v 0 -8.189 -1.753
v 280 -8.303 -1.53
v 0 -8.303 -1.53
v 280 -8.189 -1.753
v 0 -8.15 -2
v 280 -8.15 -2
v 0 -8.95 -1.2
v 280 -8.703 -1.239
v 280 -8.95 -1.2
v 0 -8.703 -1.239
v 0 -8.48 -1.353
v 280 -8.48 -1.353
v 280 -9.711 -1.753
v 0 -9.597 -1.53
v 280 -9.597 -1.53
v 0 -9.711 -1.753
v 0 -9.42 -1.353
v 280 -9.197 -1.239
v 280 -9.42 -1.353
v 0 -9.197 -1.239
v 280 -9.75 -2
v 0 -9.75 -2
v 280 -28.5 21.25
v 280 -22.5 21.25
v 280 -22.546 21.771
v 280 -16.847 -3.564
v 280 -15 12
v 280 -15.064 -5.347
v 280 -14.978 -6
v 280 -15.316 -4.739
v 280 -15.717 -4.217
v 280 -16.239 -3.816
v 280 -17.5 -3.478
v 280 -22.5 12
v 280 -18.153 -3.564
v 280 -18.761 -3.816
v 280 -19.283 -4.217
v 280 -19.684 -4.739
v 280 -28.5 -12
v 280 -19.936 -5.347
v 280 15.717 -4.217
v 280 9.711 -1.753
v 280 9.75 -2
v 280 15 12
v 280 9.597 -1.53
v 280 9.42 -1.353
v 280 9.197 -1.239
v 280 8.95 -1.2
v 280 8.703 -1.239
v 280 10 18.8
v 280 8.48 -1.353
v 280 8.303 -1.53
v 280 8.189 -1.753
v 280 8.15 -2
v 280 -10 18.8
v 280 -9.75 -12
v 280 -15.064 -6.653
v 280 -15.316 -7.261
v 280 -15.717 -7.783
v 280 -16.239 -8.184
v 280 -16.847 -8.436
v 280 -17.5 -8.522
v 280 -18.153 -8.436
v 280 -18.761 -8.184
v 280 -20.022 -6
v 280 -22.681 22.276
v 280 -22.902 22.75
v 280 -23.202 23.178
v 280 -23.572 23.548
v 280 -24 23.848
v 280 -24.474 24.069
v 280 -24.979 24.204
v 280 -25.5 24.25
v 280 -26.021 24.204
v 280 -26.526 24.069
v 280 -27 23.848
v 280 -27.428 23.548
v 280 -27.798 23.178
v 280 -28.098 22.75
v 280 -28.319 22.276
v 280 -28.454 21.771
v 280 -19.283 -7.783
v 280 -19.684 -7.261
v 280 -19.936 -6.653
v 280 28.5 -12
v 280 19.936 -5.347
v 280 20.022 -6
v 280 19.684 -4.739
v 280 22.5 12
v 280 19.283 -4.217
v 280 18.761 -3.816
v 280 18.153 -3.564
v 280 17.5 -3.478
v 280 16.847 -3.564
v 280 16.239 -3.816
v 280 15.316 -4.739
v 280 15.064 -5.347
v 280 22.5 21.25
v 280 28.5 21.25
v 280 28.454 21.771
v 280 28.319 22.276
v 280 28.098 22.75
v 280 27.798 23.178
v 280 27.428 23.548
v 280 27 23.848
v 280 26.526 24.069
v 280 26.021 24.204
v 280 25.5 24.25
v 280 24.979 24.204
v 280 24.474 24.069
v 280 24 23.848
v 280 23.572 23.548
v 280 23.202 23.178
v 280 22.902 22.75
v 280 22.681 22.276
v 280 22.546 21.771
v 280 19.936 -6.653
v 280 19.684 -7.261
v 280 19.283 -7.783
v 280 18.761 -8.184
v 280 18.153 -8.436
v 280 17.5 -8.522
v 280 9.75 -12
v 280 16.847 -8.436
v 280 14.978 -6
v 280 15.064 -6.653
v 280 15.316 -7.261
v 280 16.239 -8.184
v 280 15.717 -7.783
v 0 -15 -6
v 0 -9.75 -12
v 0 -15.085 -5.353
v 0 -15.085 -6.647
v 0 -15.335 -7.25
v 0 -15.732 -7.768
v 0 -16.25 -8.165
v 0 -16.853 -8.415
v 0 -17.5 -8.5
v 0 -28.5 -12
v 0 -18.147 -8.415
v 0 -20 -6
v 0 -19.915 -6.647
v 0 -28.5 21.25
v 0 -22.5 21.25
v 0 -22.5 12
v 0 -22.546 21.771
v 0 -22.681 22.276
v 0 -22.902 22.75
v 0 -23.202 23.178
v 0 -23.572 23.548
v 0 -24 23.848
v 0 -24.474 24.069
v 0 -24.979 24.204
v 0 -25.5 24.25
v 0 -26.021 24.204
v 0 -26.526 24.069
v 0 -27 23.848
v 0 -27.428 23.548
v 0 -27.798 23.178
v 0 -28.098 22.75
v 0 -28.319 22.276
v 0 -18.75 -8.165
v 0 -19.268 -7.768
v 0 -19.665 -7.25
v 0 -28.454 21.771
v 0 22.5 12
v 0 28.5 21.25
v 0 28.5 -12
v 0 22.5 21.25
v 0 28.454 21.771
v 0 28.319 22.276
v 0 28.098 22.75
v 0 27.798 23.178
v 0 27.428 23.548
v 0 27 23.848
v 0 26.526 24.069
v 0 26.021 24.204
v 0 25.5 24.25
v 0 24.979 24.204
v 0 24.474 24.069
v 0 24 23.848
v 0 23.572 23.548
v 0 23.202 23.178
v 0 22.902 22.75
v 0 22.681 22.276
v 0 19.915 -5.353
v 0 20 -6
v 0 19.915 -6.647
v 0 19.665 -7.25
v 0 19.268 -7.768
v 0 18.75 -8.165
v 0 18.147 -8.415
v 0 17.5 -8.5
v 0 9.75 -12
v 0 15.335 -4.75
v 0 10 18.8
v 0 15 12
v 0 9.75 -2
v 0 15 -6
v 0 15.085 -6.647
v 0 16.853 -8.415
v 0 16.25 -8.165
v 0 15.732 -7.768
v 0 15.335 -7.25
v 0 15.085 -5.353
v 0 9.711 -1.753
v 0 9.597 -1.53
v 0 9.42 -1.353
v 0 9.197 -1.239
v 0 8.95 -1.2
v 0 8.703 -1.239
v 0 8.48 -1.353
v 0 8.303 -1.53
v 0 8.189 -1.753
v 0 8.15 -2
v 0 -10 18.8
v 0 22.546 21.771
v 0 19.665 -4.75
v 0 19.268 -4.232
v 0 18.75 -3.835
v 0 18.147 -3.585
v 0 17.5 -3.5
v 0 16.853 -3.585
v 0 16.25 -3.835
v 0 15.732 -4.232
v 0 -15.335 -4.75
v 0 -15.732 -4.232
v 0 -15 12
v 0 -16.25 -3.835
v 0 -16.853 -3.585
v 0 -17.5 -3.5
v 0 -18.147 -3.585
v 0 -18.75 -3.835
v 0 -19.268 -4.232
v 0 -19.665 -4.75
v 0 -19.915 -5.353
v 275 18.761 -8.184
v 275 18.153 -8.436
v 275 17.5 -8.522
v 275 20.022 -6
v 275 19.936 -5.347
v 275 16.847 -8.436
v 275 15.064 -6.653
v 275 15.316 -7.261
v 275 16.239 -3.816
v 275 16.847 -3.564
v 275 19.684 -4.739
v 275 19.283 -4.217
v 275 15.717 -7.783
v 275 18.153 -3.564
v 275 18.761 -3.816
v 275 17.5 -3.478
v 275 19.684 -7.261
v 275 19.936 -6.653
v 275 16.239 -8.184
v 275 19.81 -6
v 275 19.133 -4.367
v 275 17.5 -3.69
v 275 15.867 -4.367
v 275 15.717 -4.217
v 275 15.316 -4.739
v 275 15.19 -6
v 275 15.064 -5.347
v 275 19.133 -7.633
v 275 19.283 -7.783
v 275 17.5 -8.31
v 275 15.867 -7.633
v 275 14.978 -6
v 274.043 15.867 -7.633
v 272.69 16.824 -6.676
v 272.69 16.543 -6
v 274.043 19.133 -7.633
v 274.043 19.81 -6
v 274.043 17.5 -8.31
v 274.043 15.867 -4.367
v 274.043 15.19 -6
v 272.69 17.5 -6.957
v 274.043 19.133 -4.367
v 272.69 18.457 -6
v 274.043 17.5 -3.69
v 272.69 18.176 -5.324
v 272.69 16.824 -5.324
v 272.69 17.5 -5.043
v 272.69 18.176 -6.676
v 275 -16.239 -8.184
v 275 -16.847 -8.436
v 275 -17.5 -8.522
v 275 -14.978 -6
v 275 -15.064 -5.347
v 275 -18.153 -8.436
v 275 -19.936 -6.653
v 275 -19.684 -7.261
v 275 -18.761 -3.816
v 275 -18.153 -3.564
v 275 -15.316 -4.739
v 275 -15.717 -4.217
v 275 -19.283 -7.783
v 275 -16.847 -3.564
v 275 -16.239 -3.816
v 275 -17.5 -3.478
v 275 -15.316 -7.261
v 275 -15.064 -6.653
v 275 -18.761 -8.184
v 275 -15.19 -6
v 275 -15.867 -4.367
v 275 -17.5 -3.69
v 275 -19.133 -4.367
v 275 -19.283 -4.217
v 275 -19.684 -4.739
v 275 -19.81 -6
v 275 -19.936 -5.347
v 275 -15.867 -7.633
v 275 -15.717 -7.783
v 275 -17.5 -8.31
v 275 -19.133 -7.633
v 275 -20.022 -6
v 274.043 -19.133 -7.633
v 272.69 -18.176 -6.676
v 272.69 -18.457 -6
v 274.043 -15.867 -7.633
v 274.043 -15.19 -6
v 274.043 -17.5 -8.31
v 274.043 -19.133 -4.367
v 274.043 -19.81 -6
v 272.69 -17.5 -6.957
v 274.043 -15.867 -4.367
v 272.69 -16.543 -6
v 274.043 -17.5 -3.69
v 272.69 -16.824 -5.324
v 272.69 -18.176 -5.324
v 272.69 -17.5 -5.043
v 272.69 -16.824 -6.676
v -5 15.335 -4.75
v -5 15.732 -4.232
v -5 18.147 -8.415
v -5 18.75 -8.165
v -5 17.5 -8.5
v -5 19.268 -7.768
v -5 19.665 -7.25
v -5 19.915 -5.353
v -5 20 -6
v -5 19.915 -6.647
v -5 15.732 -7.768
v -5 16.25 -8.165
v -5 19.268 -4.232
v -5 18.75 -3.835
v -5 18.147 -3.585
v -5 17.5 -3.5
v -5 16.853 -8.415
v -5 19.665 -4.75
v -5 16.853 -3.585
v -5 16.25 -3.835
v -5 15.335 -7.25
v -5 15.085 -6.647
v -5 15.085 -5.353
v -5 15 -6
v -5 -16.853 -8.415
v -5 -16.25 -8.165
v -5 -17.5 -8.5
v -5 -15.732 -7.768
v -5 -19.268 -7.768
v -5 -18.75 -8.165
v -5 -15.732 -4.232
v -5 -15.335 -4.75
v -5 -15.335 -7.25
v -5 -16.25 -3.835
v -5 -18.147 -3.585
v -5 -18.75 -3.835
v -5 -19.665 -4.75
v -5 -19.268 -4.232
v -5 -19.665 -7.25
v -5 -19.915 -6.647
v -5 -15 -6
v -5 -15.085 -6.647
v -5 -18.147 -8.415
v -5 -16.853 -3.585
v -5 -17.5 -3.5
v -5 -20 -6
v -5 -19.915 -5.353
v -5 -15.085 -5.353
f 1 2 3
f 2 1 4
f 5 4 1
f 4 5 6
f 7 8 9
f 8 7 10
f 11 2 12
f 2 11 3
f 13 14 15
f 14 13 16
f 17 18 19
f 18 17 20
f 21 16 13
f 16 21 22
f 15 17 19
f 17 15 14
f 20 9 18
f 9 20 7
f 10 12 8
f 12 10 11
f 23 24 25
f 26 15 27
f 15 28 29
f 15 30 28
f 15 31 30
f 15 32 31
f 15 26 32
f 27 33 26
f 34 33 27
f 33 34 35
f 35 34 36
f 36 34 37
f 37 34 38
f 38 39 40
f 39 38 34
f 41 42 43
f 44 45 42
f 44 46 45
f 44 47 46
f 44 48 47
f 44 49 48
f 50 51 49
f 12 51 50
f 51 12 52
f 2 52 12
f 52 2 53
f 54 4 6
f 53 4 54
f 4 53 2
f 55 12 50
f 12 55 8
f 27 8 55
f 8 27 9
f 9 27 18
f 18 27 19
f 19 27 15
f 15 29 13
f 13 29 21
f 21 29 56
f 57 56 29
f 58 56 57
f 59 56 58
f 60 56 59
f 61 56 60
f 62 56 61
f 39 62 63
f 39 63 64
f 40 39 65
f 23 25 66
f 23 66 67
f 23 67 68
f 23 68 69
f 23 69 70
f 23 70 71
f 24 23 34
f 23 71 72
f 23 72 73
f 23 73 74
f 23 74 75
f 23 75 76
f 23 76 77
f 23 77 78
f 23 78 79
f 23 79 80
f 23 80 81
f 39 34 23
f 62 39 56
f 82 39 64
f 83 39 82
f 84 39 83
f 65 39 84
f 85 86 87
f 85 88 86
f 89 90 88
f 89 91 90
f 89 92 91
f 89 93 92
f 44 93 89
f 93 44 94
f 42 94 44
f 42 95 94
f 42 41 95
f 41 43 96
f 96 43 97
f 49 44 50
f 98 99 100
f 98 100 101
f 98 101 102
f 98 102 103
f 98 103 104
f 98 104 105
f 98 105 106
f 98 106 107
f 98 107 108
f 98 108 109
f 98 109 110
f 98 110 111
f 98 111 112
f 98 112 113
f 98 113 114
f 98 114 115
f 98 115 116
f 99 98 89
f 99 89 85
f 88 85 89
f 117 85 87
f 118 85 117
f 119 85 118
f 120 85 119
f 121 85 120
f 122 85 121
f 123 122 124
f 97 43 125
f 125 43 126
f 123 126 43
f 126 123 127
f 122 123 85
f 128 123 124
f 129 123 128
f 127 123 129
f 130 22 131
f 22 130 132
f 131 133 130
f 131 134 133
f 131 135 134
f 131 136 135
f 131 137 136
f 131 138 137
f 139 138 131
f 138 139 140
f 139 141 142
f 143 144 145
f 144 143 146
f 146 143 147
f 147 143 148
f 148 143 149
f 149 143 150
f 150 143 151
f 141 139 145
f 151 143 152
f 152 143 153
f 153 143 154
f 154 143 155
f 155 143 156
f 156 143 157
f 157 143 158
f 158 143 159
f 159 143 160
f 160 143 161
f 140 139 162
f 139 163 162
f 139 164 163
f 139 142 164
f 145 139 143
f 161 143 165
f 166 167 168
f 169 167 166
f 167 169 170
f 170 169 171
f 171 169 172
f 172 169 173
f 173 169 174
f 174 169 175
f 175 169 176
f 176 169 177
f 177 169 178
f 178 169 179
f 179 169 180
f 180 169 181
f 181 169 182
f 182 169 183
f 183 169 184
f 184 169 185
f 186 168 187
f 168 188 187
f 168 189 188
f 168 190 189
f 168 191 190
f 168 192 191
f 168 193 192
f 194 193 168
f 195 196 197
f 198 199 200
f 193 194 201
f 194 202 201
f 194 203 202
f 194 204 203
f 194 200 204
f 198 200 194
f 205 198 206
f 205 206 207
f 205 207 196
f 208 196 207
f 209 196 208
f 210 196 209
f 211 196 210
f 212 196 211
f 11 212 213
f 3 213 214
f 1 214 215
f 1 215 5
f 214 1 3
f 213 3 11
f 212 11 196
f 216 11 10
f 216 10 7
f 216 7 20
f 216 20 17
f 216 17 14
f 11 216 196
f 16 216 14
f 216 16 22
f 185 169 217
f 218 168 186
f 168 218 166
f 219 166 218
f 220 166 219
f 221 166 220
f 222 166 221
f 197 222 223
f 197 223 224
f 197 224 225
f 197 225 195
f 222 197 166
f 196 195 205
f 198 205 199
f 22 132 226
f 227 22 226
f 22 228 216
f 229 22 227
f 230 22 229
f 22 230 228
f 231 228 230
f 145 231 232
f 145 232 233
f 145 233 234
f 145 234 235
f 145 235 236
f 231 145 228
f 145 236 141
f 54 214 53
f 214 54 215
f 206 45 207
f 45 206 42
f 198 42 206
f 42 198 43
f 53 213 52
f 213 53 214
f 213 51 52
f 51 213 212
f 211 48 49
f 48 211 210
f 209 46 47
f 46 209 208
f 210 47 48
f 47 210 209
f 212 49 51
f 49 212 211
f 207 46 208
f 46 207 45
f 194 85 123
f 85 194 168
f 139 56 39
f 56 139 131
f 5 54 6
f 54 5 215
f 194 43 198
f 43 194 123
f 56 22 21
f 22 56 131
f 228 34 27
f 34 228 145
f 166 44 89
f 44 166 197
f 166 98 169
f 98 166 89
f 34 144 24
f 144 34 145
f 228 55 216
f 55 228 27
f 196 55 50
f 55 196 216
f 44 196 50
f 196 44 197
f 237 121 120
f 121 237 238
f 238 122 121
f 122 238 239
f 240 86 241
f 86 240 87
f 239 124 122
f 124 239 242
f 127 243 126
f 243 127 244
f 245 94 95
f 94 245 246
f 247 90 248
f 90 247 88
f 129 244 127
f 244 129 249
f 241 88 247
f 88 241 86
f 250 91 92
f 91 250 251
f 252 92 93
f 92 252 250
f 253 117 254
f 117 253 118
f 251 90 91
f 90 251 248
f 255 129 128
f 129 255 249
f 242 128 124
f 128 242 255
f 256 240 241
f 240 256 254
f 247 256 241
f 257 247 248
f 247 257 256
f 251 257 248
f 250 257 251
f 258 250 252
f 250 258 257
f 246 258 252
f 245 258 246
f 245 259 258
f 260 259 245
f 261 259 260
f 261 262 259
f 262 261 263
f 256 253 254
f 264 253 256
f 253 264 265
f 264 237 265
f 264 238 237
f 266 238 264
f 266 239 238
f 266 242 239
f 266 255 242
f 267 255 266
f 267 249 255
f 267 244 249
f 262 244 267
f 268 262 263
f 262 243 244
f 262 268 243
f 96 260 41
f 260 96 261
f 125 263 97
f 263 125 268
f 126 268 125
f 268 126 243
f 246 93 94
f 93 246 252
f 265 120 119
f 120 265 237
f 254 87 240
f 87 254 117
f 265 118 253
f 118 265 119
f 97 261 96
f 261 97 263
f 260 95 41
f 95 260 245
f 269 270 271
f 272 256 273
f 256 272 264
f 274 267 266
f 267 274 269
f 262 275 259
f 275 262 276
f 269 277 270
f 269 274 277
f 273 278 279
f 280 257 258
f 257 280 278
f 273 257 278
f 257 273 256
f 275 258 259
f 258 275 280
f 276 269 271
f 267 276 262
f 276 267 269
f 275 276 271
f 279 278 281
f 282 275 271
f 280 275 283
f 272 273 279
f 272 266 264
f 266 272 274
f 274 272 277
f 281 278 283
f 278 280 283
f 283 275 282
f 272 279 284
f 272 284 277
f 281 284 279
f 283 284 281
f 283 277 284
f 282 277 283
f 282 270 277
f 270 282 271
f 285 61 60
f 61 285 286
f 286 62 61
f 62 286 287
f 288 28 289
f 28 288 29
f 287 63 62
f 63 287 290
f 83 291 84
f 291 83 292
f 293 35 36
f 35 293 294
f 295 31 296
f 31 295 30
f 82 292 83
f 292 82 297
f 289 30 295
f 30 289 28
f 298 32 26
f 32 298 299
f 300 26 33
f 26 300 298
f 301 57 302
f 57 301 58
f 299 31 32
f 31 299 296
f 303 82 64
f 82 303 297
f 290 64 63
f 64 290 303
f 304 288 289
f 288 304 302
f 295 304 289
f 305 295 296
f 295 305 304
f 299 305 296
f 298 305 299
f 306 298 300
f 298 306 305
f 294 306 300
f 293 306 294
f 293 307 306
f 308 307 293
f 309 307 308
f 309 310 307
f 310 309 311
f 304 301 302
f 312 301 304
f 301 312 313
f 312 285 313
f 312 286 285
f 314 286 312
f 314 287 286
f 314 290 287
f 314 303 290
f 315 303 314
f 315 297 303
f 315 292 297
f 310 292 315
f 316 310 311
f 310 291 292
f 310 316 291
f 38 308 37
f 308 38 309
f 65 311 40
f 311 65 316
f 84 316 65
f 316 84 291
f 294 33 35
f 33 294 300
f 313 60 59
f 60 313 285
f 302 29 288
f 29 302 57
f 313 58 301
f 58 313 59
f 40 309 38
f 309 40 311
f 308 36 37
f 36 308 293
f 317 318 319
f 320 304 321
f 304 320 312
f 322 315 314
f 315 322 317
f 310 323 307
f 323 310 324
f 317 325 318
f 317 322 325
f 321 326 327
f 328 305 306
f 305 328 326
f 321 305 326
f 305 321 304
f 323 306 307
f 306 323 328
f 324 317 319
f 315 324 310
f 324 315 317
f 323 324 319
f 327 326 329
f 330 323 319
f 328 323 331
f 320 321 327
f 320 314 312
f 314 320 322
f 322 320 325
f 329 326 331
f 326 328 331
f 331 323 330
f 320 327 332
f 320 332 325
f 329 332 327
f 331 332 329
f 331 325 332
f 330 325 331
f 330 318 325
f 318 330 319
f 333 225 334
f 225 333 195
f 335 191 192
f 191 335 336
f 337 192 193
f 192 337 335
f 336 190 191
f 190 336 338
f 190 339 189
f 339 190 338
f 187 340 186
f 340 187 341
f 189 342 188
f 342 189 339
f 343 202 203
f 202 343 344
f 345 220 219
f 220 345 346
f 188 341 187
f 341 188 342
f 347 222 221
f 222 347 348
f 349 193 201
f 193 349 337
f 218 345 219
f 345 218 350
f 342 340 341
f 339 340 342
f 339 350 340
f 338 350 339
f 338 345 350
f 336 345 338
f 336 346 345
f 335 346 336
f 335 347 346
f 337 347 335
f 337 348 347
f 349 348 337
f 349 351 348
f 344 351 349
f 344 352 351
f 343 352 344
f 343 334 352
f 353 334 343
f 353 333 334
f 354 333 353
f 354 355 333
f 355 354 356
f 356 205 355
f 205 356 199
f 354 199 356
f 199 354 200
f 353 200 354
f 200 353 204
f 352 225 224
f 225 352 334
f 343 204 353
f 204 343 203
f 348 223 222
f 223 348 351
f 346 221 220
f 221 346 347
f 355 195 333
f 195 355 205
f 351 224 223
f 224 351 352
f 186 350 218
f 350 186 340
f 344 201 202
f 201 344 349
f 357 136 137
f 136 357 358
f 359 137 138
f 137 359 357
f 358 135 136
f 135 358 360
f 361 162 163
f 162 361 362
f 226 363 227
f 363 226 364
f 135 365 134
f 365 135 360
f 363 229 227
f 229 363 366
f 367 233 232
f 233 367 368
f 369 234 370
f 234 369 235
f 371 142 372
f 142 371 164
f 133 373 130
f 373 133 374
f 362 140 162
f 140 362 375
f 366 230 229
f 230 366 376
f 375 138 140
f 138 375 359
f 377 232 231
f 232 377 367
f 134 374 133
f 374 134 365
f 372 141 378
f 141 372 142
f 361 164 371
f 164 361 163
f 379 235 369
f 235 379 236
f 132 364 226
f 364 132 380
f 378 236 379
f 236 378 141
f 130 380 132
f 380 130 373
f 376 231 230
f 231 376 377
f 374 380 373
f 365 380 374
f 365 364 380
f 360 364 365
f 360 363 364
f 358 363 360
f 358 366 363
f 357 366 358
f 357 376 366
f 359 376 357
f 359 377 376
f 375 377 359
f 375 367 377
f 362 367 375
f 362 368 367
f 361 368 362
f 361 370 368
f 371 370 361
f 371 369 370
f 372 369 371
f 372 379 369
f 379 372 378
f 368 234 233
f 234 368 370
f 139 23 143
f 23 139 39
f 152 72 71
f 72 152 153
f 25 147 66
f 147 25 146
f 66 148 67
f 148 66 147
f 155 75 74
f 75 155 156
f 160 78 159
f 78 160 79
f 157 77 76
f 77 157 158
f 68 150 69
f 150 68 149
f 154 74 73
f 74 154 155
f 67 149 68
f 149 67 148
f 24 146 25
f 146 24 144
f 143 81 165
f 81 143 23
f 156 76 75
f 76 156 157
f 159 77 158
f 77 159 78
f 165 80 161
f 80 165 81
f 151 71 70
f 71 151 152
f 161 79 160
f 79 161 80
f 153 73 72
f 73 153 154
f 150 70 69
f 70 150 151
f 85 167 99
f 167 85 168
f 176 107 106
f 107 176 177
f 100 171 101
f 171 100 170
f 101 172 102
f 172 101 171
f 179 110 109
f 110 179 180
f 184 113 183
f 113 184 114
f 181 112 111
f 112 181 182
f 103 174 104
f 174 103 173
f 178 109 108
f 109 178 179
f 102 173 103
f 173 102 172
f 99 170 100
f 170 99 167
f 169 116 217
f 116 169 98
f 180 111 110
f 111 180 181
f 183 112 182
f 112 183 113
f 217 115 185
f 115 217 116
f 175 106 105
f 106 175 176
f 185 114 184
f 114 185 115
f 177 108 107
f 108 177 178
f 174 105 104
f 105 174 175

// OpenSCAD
// file: bottom_bracket.scad
include <dimensions.scad> 

module screw_slot() {
  $fn=32;
  
  cylinder(h=total_height+1, d=screw_body_clearance);
  cylinder(h=total_height - screw_body_depth - screw_angle_depth, d=screw_head_clearance);
  translate([0, 0, total_height - screw_body_depth - screw_angle_depth]) {
    cylinder(h=screw_angle_depth, d1=screw_head_clearance, d2=screw_body_clearance);
  }
}

// Z should be set to the surface that is being joined to
module joiner_pins_male() {
  translate([depth/2, (hd_enclosure_width/2) - pin_diameter, 0]) {
    cylinder(d=pin_diameter, h=pin_length, $fn=24);
  }
  translate([depth/2, -((hd_enclosure_width/2) - pin_diameter), 0]) {
    cylinder(d=pin_diameter, h=pin_length, $fn=24);
  }
}

module cylinder_outer(height,radius,fn){
  fudge = 1/cos(180/fn);
  cylinder(h=height,r=radius*fudge,$fn=fn);
}

module sphere_outer(r,fn){
  fudge = 1/cos(180/fn);
  sphere(r=r*fudge,$fn=fn);
}

module octahedron(r=10) {
    polyhedron(
        points=[
            [r,0,0], [-r,0,0], [0,r,0], [0,-r,0], // Equator
            [0,0,r], [0,0,-r]                      // Poles
        ],
        faces=[
            [0,2,4], [2,1,4], [1,3,4], [3,0,4],    // Top faces
            [0,3,5], [3,1,5], [1,2,5], [2,0,5]     // Bottom faces
        ]
    );
}

module joiner_pins_female() {
  module pin() {
    cylinder_outer(radius=pin_diameter/2, height=pin_length, fn=24);
    //translate([0, 0, 0/*pin_length*/]) {
      sphere(r=pin_diameter/2, $fn=8);
      //}
  }
  
  translate([depth/2, (hd_enclosure_width/2) - pin_diameter, -pin_length]) {
    pin();
  }
  translate([depth/2, -((hd_enclosure_width/2) - pin_diameter), -pin_length]) {
    pin();
  }
}

module main_body(ts=true, h=total_height) {

  // the radius of the little fold in the PD side
  pd_enclosure_mini_radius = 0.8;
  dfloor = (ts ? seal_floor_offset : 0);
    
  difference() {

    // the floor
    translate([-dfloor, -hd_enclosure_width/2, 0]) {
      cube([dfloor + depth,hd_enclosure_width, h]);
    }

    // the carveout for the pet door side
    translate([depth - pd_enclosure_depth, -pd_enclosure_width/2, 0]) {
      cube([pd_enclosure_depth, pd_enclosure_width, h]);
      rotate([0, 0, 90]) {
        translate([pd_enclosure_mini_radius, 0, 0]){
          cylinder(r=pd_enclosure_mini_radius, h=h, $fn=20);
        }
        translate([pd_enclosure_width - pd_enclosure_mini_radius, 0, 0]) {
          cylinder(r=pd_enclosure_mini_radius, h=h, $fn=20);
        }
      }
    }
  }

  if (ts) {
    translate([-dfloor, 0, 0])
    trapezoid_seal(h=h);
  }
}

// the trapezoidal seal
module trapezoid_seal(h=total_height) {
  x0 = -seal_depth;

  y0 = -seal_small_width / 2;
  y1 = seal_small_width / 2;
  y2 = -seal_large_width / 2;
  y3 = seal_large_width / 2;
  
  linear_extrude(height=h) {
    polygon(points=[[x0, y0], [x0, y1], [0, y3], [0, y2]]);
  }
}

module track_slot() {
  l = seal_depth + depth + seal_floor_offset;
  
  translate([-(seal_depth + seal_floor_offset), 0, 0]) {
    rotate(a=[0,90,0]) {
      # cylinder(h=l, d=track_diameter, $fn=32);
    }
  }
}

module seal(h=overhang_height, l=hd_enclosure_depth + depth) {
  ri = overhang_indoor_width / 2;
  ro = overhang_outdoor_width / 2;

  // the indoor overhang
  translate([ri,
             -hd_enclosure_width/2 - overhang_indoor_width,
             track_height]) {
    cube([l-ri,
          overhang_indoor_width,
          h]);
    translate([0, ri, overhang_height-h])
      cylinder(r=ri, h=h, $fn=36);
  }

  // the outdoor overhang
  translate([ro,
             hd_enclosure_width/2,
             track_height]) {
    cube([l-ro,
          overhang_outdoor_width,
          h]);
    translate([0, ro, overhang_height-h])
      cylinder(r=ro, h=h, $fn=36);
  }
}

module seal_overhang(l=hd_enclosure_depth + depth) {
  translate([-hd_enclosure_depth, 0, 0])
    seal(l=l);
}


screw_y_offset = total_width / 4 + 1;
screw_x_offset = screw_body_clearance + 2;

module screw_slots() {
  translate([screw_x_offset, screw_y_offset, 0])
    screw_slot();
  
  translate([screw_x_offset, -screw_y_offset, 0])
    screw_slot();
}

// some little dots to help grip the petdoor side
module grippies(l=total_length) {
  grippy_radius = 0.75;
  grippy_thick = 0.3;
  grippy_angle = 45;
  
  for (x=[10, l-10, l/2]) {
    translate([x, 0, 0]) {
      /*
      translate([0, pd_enclosure_width/2, pd_enclosure_depth/2 - depth]) {
        // # sphere(r=grippy_radius, $fn=8);
        rotate([0, 90, 0])
        rotate([0, 0, 180-grippy_angle])
          cube([grippy_thick, grippy_radius, 3]);
      }
      translate([0, -pd_enclosure_width/2, pd_enclosure_depth/2 - depth]) {
        rotate([0, 90, 0])
        rotate([0, 0, grippy_angle])
          cube([grippy_thick, grippy_radius, 3]);
        // sphere(r=grippy_radius, $fn=8);
      }
      */
      translate([0, -pd_enclosure_width/2, pd_enclosure_depth/2 - depth])
        rotate([grippy_angle, 0, 0])
        cylinder(r=grippy_radius, h=grippy_thick, $fn=20);
      translate([0, pd_enclosure_width/2, pd_enclosure_depth/2 - depth])
        rotate([90, 0, 0])
        rotate([grippy_angle, 0, 0])
        cylinder(r=grippy_radius, h=grippy_thick, $fn=20);
    }
  }
}

module bottom_bracket() {
  
  seal_overhang();

  // screw_slots();

  difference() {
    main_body();
    track_slot();

    translate([0, 0, total_height-pin_length]) {
      joiner_pins_male();
    }
  }
}

// rotate([0, 180, 0])
translate([0, 0, -total_height]) bottom_bracket();
// file: dimensions.scad
//      +---------------------+
//      |                     |
//      |                     |
//      |                     |
//      |                     |
//      |                     |
//      |                     |
//      |                     |
//      |                     |
//      |                     |
//      |                     |
//   ^  |                     |
//   |  |                     |
//   Y  |                     |
//   |  |                     |
//   |  |                     |
//      +---------------------+
//       --  X (depth) --> 
// 

// the depth of the main body
depth = 12;

// the depth of the latch plate
latch_plate_depth = 3.25;

// the width of the enclosure for the human door side
hd_enclosure_width = 45;

// the depth of the enclosure for the human door side
hd_enclosure_depth = 10 * 2.5 + latch_plate_depth - 6 + 2;

// the width of the indoor overhang
overhang_indoor_width = 6;

// the width of the outdoor overhang
overhang_outdoor_width = 6;

// the total height
total_height = 290;

// the width of the enclosure for the pet door side
pd_enclosure_width = 20 - 0.5;

// the depth of the enclosure for the pet door side
pd_enclosure_depth = 10;

seal_floor_offset = 12;
seal_small_width = 20;
seal_large_width = 30;
seal_depth = 6.8;

// the height of the track inset area
track_height = 18;

// the diameter of the track
track_diameter = 7;

// the height of the overhang
overhang_height = total_height - track_height;

// the total width
total_width = hd_enclosure_width + overhang_indoor_width + overhang_outdoor_width;

screw_body_clearance = 4.5;
screw_head_clearance = 9;
screw_body_depth = 10;
screw_angle_depth = 3;

// pins
pin_diameter = 5;
pin_length = 5;

module simple_hd_seal() {
  // indoor HD seal
  ri = overhang_indoor_width / 2;
  
  translate([0,
             -(hd_enclosure_width/2 + overhang_indoor_width),
             -depth]) {
    cube([total_length,
          overhang_indoor_width,
          depth + hd_enclosure_depth - ri]);
    translate([0, overhang_indoor_width/2, hd_enclosure_depth + depth - ri])
      rotate([0, 90, 0])
      cylinder(r=ri, h=total_length, $fn=36);
  }

  // outdoor HD seal
  ro = overhang_outdoor_width / 2;
  
  translate([0,
             hd_enclosure_width/2,
             -depth]) {
    cube([total_length,
          overhang_outdoor_width,
          depth + hd_enclosure_depth - ro]);
    translate([0, overhang_indoor_width/2, hd_enclosure_depth + depth - ro])
      rotate([0, 90, 0])
      cylinder(r=ro, h=total_length, $fn=36);
  }
}
// main file
include <dimensions.scad>;
use <bottom_bracket.scad>;

total_length = 280; // requires build volume 300

difference() {
  rotate([0, 90, 0])
    main_body(h=total_length);
  translate([total_length, 0, 0])
    rotate([0, 90, 0])
    joiner_pins_female();
}
  

translate([-pin_length, 0, 0]) {
  rotate([0, 90, 0]) {
    joiner_pins_male();
  }
}

simple_hd_seal();
/*rotate([0, 90, 0])
translate([-hd_enclosure_depth, 0, 0])
translate([0, 0, -track_height])
seal();
*/
